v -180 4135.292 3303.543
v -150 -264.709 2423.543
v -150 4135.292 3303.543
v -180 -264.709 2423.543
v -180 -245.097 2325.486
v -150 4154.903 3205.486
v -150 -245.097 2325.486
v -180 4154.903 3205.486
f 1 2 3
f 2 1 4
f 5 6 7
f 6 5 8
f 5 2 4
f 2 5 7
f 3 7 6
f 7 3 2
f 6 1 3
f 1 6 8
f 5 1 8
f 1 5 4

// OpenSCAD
// file: tea_shop_roof_parameters.scad
// =============================================================================
// Tea Shop — GROUP 2: ROOF PARAMETERS
// -----------------------------------------------------------------------------
// OpenSCAD native unit: 1 mm (1000 mm = 1.0 m). Real-life scale.
// Reuses Group 1 (Base & Shell) dimensions and shared global coordinate system:
//   +X -> left -> right  (building width along X, left wall at X = 0)
//   +Y -> front -> back  (building depth along Y, front eave at Y = 0)
//   +Z -> up             (ground / plinth datum = Z = 0)
// =============================================================================

// --- SHARED GLOBAL VARIABLES FROM GROUP 1 (identical values) -----------------
WALL_T             = 250;   // wall panel thickness                      (0.25 m)
BUILD_W            = 6000;  // building width along X, left -> right      (6.00 m)
BUILD_D            = 4000;  // building depth along Y, front eave -> back (4.00 m)
BACK_H             = 3200;  // full wall height at the BACK (tall side)   (3.20 m)
FRONT_H            = 2400;  // wall height at the FRONT eave (short side) (2.40 m)

// Aliases matching Group 1's tea_shop_parameters.scad naming convention
wall_thickness     = WALL_T;
building_width     = BUILD_W;
building_depth     = BUILD_D;
back_height        = BACK_H;
front_eave_height  = FRONT_H;

// --- GROUP 2: ROOF SLAB & OVERHANG PARAMETERS --------------------------------
ROOF_THICKNESS      = 50;   // structural substrate slab thickness       (0.05 m)
ROOF_OVERHANG_LEFT  = 150;  // overhang beyond outer face of left wall    (0.15 m)
ROOF_OVERHANG_RIGHT = 150;  // overhang beyond outer face of right wall   (0.15 m)
ROOF_OVERHANG_BACK  = 150;  // overhang beyond outer face of back wall    (0.15 m)
ROOF_OVERHANG_FRONT = 250;  // overhang forward past front eave wall      (0.25 m)
                            // (Estimated: in reference images, the tiled roof
                            //  terminates ~250mm past the front wall where the
                            //  pergola rafters tie in. Tune here if desired.)

// --- FASCIA / BARGEBOARD TRIM PARAMETERS ------------------------------------
FASCIA_THICKNESS    = 30;   // board thickness (along X for sides, Y for front)
FASCIA_WIDTH        = 100;  // board face height (normal to roof plane)

// --- TOP RIDGE CAPPING STRIP PARAMETERS -------------------------------------
// (Raised capping strip running along the highest back edge where roof meets
//  back wall, visible in wireframe and clay renders to seal top tile ends)
RIDGE_CAP_WIDTH     = 100;  // width / run of capping strip along slope   (0.10 m)
RIDGE_CAP_HEIGHT    = 35;   // raised bump height of capping strip        (0.035 m)

// --- TERRACOTTA ROOF TILE GEOMETRY PARAMETERS -------------------------------
// Shallow repeating barrel / curved ridges running down the slope direction
TILE_PITCH          = 175;  // center-to-center spacing along X between tile crests
TILE_WIDTH          = 120;  // width of each individual curved tile crest
TILE_HEIGHT         = 25;   // raised crest height of tile bump above slab
TILE_FN             = 16;   // polygon facets for lightweight STL export

// =============================================================================
// MATHEMATICAL SLOPE DERIVATION (Trig / Geometry)
// -----------------------------------------------------------------------------
// The monopitch lean-to roof connects the top of the short front wall (Z=FRONT_H
// at Y=0) to the top of the tall back wall (Z=BACK_H at Y=BUILD_D).
//
//   Vertical Rise : ROOF_RISE  = BACK_H - FRONT_H = 3200 - 2400 = 800 mm
//   Horizontal Run: ROOF_RUN   = BUILD_D = 4000 mm
//   Slope Tangent : tan(theta) = Rise / Run = 800 / 4000 = 0.20
//   Slope Angle   : ROOF_ANGLE = atan(0.20) ≈ 11.30993°
//
// Using the exact trigonometric angle prevents any height drift between the
// walls and the roof.
// =============================================================================
ROOF_RISE           = BACK_H - FRONT_H;
ROOF_RUN            = BUILD_D;
ROOF_ANGLE          = atan(ROOF_RISE / ROOF_RUN);

// Total projected extents:
ROOF_WIDTH          = BUILD_W + ROOF_OVERHANG_LEFT + ROOF_OVERHANG_RIGHT;
ROOF_DEPTH_PROJ     = BUILD_D + ROOF_OVERHANG_FRONT + ROOF_OVERHANG_BACK;

// True length along the sloped roof plane (hypotenuse of total run and rise):
ROOF_SLOPE_LEN      = ROOF_DEPTH_PROJ / cos(ROOF_ANGLE);

// Reference coordinate for the sloped roof frame:
// Origin at the lowest front-left corner of the sloped roof slab bottom face
ROOF_ORIGIN_X       = -ROOF_OVERHANG_LEFT;
ROOF_ORIGIN_Y       = -ROOF_OVERHANG_FRONT;
ROOF_ORIGIN_Z       = FRONT_H - ROOF_OVERHANG_FRONT * tan(ROOF_ANGLE);
// file: tea_shop_roof_modules.scad
// =============================================================================
// Tea Shop — GROUP 2: ROOF MODULE LIBRARY
// -----------------------------------------------------------------------------
// This file DEFINES all roof parts (and visual assemble() preview).
// It creates NO geometry on its own when included, allowing individual
// export parts (part_*.scad) and the assembly file to include it cleanly.
//
// SHARED GLOBAL COORDINATE SYSTEM:
//   +X -> left -> right  (0 = left wall outer face, BUILD_W = right wall)
//   +Y -> front -> back  (0 = front eave wall face, BUILD_D = back wall)
//   +Z -> up             (0 = plinth / porch floor datum)
//
// All parts are positioned in place so exported STLs align without manual transforms.
//
// TODO: The wooden pergola structure (posts, crossbeams, longitudinal purlins,
//       flat roof slats, and signboard brackets) is a separate upcoming group
//       and will attach along the front eave edge (Y = -ROOF_OVERHANG_FRONT to 0)
//       extending forward over the porch slab (-base_front_margin .. 0).
// =============================================================================

include <tea_shop_roof_parameters.scad>;

// -----------------------------------------------------------------------------
// _roof_transform — internal transformation helper.
// Translates to the lowest front-left corner of the roof slab bottom face
// (X = -ROOF_OVERHANG_LEFT, Y = -ROOF_OVERHANG_FRONT, Z = ROOF_ORIGIN_Z)
// and rotates around the X-axis by ROOF_ANGLE (pitch angle).
//
// In the child coordinate system:
//   local X : across roof width [0 .. ROOF_WIDTH]
//   local Y : along roof slope UP from front eave to back [0 .. ROOF_SLOPE_LEN]
//   local Z : normal (perpendicular) to the roof plane, pointing up [0 .. thickness]
// -----------------------------------------------------------------------------
module _roof_transform() {
    translate([ROOF_ORIGIN_X, ROOF_ORIGIN_Y, ROOF_ORIGIN_Z])
        rotate([ROOF_ANGLE, 0, 0])
            children();
}


// =============================================================================
// 1. roof_slab — the structural roof substrate.
// A flat slanted slab resting directly on top of the front, back, and side walls.
// Overhangs the building on left, right, and back, and projects forward past
// the front eave to shelter the front wall and meet the pergola frame.
// =============================================================================
module roof_slab() {
    _roof_transform()
        cube([ROOF_WIDTH, ROOF_SLOPE_LEN, ROOF_THICKNESS]);
}


// =============================================================================
// 2. ridge_cap_or_top_trim — raised cap strip along the high back edge.
// As confirmed in the wireframe (countryside-tea-shop-3d-model-9cc7378ff7.webp)
// and clay render (countryside-tea-shop-3d-model-4b97af2b49.webp), this is a
// raised half-round/chamfered capping strip running along the very top edge of
// the roof where it meets the tall back wall, sealing the tile ends against weather.
// =============================================================================
module _ridge_cap_profile_2d() {
    polygon(points = [
        [-RIDGE_CAP_WIDTH/2, 0],
        [-RIDGE_CAP_WIDTH*0.4, RIDGE_CAP_HEIGHT*0.7],
        [-RIDGE_CAP_WIDTH*0.2, RIDGE_CAP_HEIGHT*0.95],
        [ 0,                   RIDGE_CAP_HEIGHT],
        [ RIDGE_CAP_WIDTH*0.2, RIDGE_CAP_HEIGHT*0.95],
        [ RIDGE_CAP_WIDTH*0.4, RIDGE_CAP_HEIGHT*0.7],
        [ RIDGE_CAP_WIDTH/2, 0]
    ]);
}

module ridge_cap_or_top_trim() {
    _roof_transform() {
        translate([-FASCIA_THICKNESS, ROOF_SLOPE_LEN - RIDGE_CAP_WIDTH/2, ROOF_THICKNESS + TILE_HEIGHT])
            rotate([0, 90, 0])
                linear_extrude(height = ROOF_WIDTH + 2 * FASCIA_THICKNESS)
                    _ridge_cap_profile_2d();
    }
}


// =============================================================================
// 3. eave_fascia_left and eave_fascia_right — wooden trim boards running along
// the left and right sloped edges (rakes/verges) of the roof slab.
// Visible in textured renders as the dark timber strips along the outer roof edges.
// Covers both the slab edge and tile profile, extending slightly below the slab.
// =============================================================================
module eave_fascia_left() {
    _roof_transform() {
        translate([-FASCIA_THICKNESS, 0, -(FASCIA_WIDTH - ROOF_THICKNESS)/2])
            cube([FASCIA_THICKNESS, ROOF_SLOPE_LEN, FASCIA_WIDTH]);
    }
}

module eave_fascia_right() {
    _roof_transform() {
        translate([ROOF_WIDTH, 0, -(FASCIA_WIDTH - ROOF_THICKNESS)/2])
            cube([FASCIA_THICKNESS, ROOF_SLOPE_LEN, FASCIA_WIDTH]);
    }
}


// =============================================================================
// 4. eave_fascia_front — horizontal trim board running across the low front
// eave of the roof slab, immediately above where the pergola structure connects.
// =============================================================================
module eave_fascia_front() {
    _roof_transform() {
        translate([-FASCIA_THICKNESS, -FASCIA_THICKNESS, -(FASCIA_WIDTH - ROOF_THICKNESS)/2])
            cube([ROOF_WIDTH + 2 * FASCIA_THICKNESS, FASCIA_THICKNESS, FASCIA_WIDTH]);
    }
}


// =============================================================================
// 5. roof_tile_pattern — shallow repeating bump/ridge pattern on the top face
// of roof_slab(), representing the terracotta barrel tiles visible in the renders.
// Modeled as real geometry using lightweight 2D extruded curved crests running
// down the slope direction (local Y) and repeated along local X with a for loop.
// Parametric spacing (TILE_PITCH) and bump size (TILE_WIDTH, TILE_HEIGHT) allow
// tuning print resolution and file size.
// =============================================================================
module _tile_crest_2d() {
    polygon(points = [
        [-TILE_WIDTH * 0.50, 0],
        [-TILE_WIDTH * 0.42, TILE_HEIGHT * 0.50],
        [-TILE_WIDTH * 0.28, TILE_HEIGHT * 0.85],
        [0,                  TILE_HEIGHT],
        [ TILE_WIDTH * 0.28, TILE_HEIGHT * 0.85],
        [ TILE_WIDTH * 0.42, TILE_HEIGHT * 0.50],
        [ TILE_WIDTH * 0.50, 0]
    ]);
}

module roof_tile_pattern() {
    _roof_transform() {
        rotate([90, 0, 0])
        translate([0, ROOF_THICKNESS, -ROOF_SLOPE_LEN])
        linear_extrude(height = ROOF_SLOPE_LEN) {
            for (x = [TILE_PITCH/2 : TILE_PITCH : ROOF_WIDTH - TILE_PITCH/2]) {
                translate([x, 0, 0])
                    _tile_crest_2d();
            }
        }
    }
}


// =============================================================================
// assemble — visual verification assembly for Group 2 pieces (not for export).
// Displays each module in a distinct contrasting color.
// =============================================================================
module assemble() {
    color("Tan")          roof_slab();
    color("Chocolate")    roof_tile_pattern();
    color("DarkRed")      ridge_cap_or_top_trim();
    color("SaddleBrown")  eave_fascia_left();
    color("SaddleBrown")  eave_fascia_right();
    color("SaddleBrown")  eave_fascia_front();
}
// main file
// =============================================================================
// part_eave_fascia_left.scad — export the LEFT SLOPED EAVE FASCIA BOARD only.
// Press F6 (render), then export as STL.
// =============================================================================

include <tea_shop_roof_modules.scad>;

eave_fascia_left();
